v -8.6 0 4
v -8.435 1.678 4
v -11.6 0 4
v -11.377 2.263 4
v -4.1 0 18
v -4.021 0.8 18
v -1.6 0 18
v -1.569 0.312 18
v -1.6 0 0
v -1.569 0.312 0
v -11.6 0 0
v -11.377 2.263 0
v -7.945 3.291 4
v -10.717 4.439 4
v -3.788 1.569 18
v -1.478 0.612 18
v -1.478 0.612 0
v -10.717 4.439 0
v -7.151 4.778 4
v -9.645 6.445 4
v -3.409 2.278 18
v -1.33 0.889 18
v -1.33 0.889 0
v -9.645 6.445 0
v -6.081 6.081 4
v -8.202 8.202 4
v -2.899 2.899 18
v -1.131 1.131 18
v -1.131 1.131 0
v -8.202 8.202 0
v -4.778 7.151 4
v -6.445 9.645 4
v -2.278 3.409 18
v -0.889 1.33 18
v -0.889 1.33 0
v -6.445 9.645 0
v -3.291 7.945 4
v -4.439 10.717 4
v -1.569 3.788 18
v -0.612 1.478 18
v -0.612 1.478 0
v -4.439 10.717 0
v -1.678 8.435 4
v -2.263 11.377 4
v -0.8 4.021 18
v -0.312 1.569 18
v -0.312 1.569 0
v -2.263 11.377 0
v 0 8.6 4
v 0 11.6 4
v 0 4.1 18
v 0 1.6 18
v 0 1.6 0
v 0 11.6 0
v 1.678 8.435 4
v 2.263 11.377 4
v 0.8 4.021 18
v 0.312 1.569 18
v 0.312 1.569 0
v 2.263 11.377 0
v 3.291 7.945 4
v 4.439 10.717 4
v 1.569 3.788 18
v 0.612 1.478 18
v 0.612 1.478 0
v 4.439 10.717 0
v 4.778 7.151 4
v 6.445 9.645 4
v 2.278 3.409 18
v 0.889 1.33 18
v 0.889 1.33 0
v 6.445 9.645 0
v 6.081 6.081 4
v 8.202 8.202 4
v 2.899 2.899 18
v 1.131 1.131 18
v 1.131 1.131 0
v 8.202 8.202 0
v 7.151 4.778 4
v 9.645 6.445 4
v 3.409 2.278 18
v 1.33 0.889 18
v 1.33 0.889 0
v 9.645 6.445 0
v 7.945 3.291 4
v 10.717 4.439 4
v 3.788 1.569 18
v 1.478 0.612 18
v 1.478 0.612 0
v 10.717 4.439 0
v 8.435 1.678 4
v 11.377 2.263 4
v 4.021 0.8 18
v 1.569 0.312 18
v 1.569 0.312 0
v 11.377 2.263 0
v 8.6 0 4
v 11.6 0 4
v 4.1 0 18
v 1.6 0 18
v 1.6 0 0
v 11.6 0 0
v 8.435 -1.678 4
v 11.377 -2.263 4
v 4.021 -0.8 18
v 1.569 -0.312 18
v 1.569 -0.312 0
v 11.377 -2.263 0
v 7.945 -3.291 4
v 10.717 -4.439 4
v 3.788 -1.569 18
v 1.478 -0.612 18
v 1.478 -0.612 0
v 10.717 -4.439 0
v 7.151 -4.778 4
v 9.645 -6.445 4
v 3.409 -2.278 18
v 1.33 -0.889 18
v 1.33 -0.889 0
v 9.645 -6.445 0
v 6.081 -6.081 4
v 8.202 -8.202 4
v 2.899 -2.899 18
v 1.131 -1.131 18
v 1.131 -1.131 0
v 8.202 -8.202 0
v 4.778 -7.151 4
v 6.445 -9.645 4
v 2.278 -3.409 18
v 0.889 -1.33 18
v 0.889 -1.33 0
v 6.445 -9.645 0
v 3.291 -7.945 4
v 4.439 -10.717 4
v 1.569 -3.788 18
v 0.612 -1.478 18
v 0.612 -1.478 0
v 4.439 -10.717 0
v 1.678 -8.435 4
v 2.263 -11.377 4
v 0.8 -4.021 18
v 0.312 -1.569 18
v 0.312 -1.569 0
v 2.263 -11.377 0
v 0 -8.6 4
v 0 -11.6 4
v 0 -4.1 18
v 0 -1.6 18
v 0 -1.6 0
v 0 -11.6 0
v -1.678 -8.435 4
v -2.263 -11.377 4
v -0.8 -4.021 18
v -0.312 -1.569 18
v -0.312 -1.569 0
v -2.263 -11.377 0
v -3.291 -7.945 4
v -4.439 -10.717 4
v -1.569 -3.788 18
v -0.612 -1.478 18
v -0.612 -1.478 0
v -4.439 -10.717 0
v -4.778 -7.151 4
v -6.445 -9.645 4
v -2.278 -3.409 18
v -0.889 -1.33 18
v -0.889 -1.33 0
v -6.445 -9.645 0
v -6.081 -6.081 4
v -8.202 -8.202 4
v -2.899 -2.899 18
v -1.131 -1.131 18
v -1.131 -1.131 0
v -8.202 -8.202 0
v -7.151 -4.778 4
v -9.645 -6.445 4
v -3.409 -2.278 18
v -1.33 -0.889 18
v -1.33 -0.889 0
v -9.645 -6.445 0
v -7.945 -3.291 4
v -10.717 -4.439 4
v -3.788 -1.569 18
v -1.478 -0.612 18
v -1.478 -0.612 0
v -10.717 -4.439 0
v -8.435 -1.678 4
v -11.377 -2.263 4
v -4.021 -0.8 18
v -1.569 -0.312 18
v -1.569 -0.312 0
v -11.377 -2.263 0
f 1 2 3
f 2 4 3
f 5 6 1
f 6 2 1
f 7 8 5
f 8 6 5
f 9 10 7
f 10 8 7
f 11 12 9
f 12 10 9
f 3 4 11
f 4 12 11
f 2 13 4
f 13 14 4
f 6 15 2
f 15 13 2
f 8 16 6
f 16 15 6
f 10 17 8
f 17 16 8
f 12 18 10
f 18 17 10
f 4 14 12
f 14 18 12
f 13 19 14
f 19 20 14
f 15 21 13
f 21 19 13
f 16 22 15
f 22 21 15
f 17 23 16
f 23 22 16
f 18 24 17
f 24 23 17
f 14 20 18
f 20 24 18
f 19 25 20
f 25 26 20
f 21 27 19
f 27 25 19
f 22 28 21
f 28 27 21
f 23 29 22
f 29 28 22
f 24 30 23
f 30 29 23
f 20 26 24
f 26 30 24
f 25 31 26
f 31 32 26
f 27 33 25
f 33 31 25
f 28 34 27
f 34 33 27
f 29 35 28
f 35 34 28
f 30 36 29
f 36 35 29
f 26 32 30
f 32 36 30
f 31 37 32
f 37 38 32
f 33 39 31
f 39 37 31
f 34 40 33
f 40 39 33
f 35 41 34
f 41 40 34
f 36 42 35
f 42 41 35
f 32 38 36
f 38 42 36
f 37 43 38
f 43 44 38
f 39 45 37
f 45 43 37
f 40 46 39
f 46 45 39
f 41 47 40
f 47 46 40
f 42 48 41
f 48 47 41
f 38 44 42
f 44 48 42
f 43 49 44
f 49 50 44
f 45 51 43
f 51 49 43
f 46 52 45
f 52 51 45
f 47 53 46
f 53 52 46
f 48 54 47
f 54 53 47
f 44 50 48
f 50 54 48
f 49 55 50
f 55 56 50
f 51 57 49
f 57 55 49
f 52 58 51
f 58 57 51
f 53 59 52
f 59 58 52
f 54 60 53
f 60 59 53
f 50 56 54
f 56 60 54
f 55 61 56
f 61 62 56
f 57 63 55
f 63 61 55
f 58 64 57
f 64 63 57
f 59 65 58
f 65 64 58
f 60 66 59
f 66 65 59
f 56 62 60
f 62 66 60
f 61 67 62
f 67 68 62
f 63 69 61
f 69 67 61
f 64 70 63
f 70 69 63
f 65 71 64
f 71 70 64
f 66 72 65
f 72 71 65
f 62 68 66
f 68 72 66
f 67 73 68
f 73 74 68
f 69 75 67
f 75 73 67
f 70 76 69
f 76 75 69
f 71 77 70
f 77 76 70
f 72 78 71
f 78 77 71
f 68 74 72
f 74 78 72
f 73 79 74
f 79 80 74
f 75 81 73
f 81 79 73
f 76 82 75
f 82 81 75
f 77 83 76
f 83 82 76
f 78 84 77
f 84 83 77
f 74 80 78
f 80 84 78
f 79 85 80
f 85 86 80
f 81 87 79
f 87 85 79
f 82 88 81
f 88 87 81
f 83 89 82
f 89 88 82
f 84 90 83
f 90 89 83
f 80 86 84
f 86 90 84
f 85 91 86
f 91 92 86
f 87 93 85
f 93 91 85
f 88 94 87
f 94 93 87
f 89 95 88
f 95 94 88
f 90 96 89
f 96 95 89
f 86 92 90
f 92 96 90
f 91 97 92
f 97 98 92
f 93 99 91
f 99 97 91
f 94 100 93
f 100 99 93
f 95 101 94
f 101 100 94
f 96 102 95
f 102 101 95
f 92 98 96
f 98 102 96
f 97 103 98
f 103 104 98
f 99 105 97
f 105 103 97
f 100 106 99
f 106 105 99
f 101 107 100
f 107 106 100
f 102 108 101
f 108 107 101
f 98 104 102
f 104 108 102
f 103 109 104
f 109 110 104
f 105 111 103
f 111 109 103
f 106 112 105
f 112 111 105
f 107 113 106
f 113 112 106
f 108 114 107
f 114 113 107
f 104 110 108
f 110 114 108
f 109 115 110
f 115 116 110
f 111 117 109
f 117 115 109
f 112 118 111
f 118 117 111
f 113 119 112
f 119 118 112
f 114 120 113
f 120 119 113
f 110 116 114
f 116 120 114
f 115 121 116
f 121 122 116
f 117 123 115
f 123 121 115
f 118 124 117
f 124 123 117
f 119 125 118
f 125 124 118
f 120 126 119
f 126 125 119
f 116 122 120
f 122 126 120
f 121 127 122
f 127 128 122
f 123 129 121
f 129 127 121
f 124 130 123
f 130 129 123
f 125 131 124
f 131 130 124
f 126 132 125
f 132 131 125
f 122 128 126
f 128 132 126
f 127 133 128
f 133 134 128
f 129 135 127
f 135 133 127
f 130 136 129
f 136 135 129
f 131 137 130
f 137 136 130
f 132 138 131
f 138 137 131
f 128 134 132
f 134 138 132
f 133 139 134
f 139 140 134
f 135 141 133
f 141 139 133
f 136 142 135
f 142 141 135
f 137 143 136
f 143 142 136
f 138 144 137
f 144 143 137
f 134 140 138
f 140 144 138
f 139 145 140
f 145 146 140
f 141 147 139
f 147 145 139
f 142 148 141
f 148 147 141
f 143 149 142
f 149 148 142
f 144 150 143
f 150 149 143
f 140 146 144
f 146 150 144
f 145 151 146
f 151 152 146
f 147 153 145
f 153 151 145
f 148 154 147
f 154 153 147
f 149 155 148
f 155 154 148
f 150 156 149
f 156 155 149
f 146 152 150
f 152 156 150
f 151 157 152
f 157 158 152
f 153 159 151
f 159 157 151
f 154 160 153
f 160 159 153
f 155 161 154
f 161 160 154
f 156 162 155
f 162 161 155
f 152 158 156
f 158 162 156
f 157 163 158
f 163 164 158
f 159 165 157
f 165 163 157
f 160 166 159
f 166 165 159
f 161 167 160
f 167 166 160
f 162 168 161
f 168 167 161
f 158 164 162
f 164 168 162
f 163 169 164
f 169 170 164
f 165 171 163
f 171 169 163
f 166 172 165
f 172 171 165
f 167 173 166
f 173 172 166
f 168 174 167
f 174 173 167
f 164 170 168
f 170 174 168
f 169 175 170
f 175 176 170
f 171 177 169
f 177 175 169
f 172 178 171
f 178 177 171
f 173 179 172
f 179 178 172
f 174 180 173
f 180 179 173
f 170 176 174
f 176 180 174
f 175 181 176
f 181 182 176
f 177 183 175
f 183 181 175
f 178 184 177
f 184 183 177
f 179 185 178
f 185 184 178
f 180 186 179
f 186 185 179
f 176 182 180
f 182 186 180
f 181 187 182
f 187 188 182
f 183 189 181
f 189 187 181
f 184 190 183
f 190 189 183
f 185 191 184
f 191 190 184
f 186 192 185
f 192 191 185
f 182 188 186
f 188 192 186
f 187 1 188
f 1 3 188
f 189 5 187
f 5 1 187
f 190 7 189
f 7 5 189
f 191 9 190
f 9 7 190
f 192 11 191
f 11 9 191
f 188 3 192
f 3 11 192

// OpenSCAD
$fn = 32;

// ----------------------------------------------------------------------
// Profiled standoff: conical spacer, 18 mm long, bore 3.2 mm
// ----------------------------------------------------------------------

// --- parameters (mm) ---
revolve_angle = 360;      // full turn around the Z axis
profile_points = 6;       // points of the closed outline

profile = [[1.6, 0], [11.6, 0], [11.6, 4], [8.6, 4], [4.1, 18], [1.6, 18]];  // single closed polygon, 6 points, counter clockwise

// --- the one profile operation ---
rotate_extrude(angle = revolve_angle) polygon(points = profile);
